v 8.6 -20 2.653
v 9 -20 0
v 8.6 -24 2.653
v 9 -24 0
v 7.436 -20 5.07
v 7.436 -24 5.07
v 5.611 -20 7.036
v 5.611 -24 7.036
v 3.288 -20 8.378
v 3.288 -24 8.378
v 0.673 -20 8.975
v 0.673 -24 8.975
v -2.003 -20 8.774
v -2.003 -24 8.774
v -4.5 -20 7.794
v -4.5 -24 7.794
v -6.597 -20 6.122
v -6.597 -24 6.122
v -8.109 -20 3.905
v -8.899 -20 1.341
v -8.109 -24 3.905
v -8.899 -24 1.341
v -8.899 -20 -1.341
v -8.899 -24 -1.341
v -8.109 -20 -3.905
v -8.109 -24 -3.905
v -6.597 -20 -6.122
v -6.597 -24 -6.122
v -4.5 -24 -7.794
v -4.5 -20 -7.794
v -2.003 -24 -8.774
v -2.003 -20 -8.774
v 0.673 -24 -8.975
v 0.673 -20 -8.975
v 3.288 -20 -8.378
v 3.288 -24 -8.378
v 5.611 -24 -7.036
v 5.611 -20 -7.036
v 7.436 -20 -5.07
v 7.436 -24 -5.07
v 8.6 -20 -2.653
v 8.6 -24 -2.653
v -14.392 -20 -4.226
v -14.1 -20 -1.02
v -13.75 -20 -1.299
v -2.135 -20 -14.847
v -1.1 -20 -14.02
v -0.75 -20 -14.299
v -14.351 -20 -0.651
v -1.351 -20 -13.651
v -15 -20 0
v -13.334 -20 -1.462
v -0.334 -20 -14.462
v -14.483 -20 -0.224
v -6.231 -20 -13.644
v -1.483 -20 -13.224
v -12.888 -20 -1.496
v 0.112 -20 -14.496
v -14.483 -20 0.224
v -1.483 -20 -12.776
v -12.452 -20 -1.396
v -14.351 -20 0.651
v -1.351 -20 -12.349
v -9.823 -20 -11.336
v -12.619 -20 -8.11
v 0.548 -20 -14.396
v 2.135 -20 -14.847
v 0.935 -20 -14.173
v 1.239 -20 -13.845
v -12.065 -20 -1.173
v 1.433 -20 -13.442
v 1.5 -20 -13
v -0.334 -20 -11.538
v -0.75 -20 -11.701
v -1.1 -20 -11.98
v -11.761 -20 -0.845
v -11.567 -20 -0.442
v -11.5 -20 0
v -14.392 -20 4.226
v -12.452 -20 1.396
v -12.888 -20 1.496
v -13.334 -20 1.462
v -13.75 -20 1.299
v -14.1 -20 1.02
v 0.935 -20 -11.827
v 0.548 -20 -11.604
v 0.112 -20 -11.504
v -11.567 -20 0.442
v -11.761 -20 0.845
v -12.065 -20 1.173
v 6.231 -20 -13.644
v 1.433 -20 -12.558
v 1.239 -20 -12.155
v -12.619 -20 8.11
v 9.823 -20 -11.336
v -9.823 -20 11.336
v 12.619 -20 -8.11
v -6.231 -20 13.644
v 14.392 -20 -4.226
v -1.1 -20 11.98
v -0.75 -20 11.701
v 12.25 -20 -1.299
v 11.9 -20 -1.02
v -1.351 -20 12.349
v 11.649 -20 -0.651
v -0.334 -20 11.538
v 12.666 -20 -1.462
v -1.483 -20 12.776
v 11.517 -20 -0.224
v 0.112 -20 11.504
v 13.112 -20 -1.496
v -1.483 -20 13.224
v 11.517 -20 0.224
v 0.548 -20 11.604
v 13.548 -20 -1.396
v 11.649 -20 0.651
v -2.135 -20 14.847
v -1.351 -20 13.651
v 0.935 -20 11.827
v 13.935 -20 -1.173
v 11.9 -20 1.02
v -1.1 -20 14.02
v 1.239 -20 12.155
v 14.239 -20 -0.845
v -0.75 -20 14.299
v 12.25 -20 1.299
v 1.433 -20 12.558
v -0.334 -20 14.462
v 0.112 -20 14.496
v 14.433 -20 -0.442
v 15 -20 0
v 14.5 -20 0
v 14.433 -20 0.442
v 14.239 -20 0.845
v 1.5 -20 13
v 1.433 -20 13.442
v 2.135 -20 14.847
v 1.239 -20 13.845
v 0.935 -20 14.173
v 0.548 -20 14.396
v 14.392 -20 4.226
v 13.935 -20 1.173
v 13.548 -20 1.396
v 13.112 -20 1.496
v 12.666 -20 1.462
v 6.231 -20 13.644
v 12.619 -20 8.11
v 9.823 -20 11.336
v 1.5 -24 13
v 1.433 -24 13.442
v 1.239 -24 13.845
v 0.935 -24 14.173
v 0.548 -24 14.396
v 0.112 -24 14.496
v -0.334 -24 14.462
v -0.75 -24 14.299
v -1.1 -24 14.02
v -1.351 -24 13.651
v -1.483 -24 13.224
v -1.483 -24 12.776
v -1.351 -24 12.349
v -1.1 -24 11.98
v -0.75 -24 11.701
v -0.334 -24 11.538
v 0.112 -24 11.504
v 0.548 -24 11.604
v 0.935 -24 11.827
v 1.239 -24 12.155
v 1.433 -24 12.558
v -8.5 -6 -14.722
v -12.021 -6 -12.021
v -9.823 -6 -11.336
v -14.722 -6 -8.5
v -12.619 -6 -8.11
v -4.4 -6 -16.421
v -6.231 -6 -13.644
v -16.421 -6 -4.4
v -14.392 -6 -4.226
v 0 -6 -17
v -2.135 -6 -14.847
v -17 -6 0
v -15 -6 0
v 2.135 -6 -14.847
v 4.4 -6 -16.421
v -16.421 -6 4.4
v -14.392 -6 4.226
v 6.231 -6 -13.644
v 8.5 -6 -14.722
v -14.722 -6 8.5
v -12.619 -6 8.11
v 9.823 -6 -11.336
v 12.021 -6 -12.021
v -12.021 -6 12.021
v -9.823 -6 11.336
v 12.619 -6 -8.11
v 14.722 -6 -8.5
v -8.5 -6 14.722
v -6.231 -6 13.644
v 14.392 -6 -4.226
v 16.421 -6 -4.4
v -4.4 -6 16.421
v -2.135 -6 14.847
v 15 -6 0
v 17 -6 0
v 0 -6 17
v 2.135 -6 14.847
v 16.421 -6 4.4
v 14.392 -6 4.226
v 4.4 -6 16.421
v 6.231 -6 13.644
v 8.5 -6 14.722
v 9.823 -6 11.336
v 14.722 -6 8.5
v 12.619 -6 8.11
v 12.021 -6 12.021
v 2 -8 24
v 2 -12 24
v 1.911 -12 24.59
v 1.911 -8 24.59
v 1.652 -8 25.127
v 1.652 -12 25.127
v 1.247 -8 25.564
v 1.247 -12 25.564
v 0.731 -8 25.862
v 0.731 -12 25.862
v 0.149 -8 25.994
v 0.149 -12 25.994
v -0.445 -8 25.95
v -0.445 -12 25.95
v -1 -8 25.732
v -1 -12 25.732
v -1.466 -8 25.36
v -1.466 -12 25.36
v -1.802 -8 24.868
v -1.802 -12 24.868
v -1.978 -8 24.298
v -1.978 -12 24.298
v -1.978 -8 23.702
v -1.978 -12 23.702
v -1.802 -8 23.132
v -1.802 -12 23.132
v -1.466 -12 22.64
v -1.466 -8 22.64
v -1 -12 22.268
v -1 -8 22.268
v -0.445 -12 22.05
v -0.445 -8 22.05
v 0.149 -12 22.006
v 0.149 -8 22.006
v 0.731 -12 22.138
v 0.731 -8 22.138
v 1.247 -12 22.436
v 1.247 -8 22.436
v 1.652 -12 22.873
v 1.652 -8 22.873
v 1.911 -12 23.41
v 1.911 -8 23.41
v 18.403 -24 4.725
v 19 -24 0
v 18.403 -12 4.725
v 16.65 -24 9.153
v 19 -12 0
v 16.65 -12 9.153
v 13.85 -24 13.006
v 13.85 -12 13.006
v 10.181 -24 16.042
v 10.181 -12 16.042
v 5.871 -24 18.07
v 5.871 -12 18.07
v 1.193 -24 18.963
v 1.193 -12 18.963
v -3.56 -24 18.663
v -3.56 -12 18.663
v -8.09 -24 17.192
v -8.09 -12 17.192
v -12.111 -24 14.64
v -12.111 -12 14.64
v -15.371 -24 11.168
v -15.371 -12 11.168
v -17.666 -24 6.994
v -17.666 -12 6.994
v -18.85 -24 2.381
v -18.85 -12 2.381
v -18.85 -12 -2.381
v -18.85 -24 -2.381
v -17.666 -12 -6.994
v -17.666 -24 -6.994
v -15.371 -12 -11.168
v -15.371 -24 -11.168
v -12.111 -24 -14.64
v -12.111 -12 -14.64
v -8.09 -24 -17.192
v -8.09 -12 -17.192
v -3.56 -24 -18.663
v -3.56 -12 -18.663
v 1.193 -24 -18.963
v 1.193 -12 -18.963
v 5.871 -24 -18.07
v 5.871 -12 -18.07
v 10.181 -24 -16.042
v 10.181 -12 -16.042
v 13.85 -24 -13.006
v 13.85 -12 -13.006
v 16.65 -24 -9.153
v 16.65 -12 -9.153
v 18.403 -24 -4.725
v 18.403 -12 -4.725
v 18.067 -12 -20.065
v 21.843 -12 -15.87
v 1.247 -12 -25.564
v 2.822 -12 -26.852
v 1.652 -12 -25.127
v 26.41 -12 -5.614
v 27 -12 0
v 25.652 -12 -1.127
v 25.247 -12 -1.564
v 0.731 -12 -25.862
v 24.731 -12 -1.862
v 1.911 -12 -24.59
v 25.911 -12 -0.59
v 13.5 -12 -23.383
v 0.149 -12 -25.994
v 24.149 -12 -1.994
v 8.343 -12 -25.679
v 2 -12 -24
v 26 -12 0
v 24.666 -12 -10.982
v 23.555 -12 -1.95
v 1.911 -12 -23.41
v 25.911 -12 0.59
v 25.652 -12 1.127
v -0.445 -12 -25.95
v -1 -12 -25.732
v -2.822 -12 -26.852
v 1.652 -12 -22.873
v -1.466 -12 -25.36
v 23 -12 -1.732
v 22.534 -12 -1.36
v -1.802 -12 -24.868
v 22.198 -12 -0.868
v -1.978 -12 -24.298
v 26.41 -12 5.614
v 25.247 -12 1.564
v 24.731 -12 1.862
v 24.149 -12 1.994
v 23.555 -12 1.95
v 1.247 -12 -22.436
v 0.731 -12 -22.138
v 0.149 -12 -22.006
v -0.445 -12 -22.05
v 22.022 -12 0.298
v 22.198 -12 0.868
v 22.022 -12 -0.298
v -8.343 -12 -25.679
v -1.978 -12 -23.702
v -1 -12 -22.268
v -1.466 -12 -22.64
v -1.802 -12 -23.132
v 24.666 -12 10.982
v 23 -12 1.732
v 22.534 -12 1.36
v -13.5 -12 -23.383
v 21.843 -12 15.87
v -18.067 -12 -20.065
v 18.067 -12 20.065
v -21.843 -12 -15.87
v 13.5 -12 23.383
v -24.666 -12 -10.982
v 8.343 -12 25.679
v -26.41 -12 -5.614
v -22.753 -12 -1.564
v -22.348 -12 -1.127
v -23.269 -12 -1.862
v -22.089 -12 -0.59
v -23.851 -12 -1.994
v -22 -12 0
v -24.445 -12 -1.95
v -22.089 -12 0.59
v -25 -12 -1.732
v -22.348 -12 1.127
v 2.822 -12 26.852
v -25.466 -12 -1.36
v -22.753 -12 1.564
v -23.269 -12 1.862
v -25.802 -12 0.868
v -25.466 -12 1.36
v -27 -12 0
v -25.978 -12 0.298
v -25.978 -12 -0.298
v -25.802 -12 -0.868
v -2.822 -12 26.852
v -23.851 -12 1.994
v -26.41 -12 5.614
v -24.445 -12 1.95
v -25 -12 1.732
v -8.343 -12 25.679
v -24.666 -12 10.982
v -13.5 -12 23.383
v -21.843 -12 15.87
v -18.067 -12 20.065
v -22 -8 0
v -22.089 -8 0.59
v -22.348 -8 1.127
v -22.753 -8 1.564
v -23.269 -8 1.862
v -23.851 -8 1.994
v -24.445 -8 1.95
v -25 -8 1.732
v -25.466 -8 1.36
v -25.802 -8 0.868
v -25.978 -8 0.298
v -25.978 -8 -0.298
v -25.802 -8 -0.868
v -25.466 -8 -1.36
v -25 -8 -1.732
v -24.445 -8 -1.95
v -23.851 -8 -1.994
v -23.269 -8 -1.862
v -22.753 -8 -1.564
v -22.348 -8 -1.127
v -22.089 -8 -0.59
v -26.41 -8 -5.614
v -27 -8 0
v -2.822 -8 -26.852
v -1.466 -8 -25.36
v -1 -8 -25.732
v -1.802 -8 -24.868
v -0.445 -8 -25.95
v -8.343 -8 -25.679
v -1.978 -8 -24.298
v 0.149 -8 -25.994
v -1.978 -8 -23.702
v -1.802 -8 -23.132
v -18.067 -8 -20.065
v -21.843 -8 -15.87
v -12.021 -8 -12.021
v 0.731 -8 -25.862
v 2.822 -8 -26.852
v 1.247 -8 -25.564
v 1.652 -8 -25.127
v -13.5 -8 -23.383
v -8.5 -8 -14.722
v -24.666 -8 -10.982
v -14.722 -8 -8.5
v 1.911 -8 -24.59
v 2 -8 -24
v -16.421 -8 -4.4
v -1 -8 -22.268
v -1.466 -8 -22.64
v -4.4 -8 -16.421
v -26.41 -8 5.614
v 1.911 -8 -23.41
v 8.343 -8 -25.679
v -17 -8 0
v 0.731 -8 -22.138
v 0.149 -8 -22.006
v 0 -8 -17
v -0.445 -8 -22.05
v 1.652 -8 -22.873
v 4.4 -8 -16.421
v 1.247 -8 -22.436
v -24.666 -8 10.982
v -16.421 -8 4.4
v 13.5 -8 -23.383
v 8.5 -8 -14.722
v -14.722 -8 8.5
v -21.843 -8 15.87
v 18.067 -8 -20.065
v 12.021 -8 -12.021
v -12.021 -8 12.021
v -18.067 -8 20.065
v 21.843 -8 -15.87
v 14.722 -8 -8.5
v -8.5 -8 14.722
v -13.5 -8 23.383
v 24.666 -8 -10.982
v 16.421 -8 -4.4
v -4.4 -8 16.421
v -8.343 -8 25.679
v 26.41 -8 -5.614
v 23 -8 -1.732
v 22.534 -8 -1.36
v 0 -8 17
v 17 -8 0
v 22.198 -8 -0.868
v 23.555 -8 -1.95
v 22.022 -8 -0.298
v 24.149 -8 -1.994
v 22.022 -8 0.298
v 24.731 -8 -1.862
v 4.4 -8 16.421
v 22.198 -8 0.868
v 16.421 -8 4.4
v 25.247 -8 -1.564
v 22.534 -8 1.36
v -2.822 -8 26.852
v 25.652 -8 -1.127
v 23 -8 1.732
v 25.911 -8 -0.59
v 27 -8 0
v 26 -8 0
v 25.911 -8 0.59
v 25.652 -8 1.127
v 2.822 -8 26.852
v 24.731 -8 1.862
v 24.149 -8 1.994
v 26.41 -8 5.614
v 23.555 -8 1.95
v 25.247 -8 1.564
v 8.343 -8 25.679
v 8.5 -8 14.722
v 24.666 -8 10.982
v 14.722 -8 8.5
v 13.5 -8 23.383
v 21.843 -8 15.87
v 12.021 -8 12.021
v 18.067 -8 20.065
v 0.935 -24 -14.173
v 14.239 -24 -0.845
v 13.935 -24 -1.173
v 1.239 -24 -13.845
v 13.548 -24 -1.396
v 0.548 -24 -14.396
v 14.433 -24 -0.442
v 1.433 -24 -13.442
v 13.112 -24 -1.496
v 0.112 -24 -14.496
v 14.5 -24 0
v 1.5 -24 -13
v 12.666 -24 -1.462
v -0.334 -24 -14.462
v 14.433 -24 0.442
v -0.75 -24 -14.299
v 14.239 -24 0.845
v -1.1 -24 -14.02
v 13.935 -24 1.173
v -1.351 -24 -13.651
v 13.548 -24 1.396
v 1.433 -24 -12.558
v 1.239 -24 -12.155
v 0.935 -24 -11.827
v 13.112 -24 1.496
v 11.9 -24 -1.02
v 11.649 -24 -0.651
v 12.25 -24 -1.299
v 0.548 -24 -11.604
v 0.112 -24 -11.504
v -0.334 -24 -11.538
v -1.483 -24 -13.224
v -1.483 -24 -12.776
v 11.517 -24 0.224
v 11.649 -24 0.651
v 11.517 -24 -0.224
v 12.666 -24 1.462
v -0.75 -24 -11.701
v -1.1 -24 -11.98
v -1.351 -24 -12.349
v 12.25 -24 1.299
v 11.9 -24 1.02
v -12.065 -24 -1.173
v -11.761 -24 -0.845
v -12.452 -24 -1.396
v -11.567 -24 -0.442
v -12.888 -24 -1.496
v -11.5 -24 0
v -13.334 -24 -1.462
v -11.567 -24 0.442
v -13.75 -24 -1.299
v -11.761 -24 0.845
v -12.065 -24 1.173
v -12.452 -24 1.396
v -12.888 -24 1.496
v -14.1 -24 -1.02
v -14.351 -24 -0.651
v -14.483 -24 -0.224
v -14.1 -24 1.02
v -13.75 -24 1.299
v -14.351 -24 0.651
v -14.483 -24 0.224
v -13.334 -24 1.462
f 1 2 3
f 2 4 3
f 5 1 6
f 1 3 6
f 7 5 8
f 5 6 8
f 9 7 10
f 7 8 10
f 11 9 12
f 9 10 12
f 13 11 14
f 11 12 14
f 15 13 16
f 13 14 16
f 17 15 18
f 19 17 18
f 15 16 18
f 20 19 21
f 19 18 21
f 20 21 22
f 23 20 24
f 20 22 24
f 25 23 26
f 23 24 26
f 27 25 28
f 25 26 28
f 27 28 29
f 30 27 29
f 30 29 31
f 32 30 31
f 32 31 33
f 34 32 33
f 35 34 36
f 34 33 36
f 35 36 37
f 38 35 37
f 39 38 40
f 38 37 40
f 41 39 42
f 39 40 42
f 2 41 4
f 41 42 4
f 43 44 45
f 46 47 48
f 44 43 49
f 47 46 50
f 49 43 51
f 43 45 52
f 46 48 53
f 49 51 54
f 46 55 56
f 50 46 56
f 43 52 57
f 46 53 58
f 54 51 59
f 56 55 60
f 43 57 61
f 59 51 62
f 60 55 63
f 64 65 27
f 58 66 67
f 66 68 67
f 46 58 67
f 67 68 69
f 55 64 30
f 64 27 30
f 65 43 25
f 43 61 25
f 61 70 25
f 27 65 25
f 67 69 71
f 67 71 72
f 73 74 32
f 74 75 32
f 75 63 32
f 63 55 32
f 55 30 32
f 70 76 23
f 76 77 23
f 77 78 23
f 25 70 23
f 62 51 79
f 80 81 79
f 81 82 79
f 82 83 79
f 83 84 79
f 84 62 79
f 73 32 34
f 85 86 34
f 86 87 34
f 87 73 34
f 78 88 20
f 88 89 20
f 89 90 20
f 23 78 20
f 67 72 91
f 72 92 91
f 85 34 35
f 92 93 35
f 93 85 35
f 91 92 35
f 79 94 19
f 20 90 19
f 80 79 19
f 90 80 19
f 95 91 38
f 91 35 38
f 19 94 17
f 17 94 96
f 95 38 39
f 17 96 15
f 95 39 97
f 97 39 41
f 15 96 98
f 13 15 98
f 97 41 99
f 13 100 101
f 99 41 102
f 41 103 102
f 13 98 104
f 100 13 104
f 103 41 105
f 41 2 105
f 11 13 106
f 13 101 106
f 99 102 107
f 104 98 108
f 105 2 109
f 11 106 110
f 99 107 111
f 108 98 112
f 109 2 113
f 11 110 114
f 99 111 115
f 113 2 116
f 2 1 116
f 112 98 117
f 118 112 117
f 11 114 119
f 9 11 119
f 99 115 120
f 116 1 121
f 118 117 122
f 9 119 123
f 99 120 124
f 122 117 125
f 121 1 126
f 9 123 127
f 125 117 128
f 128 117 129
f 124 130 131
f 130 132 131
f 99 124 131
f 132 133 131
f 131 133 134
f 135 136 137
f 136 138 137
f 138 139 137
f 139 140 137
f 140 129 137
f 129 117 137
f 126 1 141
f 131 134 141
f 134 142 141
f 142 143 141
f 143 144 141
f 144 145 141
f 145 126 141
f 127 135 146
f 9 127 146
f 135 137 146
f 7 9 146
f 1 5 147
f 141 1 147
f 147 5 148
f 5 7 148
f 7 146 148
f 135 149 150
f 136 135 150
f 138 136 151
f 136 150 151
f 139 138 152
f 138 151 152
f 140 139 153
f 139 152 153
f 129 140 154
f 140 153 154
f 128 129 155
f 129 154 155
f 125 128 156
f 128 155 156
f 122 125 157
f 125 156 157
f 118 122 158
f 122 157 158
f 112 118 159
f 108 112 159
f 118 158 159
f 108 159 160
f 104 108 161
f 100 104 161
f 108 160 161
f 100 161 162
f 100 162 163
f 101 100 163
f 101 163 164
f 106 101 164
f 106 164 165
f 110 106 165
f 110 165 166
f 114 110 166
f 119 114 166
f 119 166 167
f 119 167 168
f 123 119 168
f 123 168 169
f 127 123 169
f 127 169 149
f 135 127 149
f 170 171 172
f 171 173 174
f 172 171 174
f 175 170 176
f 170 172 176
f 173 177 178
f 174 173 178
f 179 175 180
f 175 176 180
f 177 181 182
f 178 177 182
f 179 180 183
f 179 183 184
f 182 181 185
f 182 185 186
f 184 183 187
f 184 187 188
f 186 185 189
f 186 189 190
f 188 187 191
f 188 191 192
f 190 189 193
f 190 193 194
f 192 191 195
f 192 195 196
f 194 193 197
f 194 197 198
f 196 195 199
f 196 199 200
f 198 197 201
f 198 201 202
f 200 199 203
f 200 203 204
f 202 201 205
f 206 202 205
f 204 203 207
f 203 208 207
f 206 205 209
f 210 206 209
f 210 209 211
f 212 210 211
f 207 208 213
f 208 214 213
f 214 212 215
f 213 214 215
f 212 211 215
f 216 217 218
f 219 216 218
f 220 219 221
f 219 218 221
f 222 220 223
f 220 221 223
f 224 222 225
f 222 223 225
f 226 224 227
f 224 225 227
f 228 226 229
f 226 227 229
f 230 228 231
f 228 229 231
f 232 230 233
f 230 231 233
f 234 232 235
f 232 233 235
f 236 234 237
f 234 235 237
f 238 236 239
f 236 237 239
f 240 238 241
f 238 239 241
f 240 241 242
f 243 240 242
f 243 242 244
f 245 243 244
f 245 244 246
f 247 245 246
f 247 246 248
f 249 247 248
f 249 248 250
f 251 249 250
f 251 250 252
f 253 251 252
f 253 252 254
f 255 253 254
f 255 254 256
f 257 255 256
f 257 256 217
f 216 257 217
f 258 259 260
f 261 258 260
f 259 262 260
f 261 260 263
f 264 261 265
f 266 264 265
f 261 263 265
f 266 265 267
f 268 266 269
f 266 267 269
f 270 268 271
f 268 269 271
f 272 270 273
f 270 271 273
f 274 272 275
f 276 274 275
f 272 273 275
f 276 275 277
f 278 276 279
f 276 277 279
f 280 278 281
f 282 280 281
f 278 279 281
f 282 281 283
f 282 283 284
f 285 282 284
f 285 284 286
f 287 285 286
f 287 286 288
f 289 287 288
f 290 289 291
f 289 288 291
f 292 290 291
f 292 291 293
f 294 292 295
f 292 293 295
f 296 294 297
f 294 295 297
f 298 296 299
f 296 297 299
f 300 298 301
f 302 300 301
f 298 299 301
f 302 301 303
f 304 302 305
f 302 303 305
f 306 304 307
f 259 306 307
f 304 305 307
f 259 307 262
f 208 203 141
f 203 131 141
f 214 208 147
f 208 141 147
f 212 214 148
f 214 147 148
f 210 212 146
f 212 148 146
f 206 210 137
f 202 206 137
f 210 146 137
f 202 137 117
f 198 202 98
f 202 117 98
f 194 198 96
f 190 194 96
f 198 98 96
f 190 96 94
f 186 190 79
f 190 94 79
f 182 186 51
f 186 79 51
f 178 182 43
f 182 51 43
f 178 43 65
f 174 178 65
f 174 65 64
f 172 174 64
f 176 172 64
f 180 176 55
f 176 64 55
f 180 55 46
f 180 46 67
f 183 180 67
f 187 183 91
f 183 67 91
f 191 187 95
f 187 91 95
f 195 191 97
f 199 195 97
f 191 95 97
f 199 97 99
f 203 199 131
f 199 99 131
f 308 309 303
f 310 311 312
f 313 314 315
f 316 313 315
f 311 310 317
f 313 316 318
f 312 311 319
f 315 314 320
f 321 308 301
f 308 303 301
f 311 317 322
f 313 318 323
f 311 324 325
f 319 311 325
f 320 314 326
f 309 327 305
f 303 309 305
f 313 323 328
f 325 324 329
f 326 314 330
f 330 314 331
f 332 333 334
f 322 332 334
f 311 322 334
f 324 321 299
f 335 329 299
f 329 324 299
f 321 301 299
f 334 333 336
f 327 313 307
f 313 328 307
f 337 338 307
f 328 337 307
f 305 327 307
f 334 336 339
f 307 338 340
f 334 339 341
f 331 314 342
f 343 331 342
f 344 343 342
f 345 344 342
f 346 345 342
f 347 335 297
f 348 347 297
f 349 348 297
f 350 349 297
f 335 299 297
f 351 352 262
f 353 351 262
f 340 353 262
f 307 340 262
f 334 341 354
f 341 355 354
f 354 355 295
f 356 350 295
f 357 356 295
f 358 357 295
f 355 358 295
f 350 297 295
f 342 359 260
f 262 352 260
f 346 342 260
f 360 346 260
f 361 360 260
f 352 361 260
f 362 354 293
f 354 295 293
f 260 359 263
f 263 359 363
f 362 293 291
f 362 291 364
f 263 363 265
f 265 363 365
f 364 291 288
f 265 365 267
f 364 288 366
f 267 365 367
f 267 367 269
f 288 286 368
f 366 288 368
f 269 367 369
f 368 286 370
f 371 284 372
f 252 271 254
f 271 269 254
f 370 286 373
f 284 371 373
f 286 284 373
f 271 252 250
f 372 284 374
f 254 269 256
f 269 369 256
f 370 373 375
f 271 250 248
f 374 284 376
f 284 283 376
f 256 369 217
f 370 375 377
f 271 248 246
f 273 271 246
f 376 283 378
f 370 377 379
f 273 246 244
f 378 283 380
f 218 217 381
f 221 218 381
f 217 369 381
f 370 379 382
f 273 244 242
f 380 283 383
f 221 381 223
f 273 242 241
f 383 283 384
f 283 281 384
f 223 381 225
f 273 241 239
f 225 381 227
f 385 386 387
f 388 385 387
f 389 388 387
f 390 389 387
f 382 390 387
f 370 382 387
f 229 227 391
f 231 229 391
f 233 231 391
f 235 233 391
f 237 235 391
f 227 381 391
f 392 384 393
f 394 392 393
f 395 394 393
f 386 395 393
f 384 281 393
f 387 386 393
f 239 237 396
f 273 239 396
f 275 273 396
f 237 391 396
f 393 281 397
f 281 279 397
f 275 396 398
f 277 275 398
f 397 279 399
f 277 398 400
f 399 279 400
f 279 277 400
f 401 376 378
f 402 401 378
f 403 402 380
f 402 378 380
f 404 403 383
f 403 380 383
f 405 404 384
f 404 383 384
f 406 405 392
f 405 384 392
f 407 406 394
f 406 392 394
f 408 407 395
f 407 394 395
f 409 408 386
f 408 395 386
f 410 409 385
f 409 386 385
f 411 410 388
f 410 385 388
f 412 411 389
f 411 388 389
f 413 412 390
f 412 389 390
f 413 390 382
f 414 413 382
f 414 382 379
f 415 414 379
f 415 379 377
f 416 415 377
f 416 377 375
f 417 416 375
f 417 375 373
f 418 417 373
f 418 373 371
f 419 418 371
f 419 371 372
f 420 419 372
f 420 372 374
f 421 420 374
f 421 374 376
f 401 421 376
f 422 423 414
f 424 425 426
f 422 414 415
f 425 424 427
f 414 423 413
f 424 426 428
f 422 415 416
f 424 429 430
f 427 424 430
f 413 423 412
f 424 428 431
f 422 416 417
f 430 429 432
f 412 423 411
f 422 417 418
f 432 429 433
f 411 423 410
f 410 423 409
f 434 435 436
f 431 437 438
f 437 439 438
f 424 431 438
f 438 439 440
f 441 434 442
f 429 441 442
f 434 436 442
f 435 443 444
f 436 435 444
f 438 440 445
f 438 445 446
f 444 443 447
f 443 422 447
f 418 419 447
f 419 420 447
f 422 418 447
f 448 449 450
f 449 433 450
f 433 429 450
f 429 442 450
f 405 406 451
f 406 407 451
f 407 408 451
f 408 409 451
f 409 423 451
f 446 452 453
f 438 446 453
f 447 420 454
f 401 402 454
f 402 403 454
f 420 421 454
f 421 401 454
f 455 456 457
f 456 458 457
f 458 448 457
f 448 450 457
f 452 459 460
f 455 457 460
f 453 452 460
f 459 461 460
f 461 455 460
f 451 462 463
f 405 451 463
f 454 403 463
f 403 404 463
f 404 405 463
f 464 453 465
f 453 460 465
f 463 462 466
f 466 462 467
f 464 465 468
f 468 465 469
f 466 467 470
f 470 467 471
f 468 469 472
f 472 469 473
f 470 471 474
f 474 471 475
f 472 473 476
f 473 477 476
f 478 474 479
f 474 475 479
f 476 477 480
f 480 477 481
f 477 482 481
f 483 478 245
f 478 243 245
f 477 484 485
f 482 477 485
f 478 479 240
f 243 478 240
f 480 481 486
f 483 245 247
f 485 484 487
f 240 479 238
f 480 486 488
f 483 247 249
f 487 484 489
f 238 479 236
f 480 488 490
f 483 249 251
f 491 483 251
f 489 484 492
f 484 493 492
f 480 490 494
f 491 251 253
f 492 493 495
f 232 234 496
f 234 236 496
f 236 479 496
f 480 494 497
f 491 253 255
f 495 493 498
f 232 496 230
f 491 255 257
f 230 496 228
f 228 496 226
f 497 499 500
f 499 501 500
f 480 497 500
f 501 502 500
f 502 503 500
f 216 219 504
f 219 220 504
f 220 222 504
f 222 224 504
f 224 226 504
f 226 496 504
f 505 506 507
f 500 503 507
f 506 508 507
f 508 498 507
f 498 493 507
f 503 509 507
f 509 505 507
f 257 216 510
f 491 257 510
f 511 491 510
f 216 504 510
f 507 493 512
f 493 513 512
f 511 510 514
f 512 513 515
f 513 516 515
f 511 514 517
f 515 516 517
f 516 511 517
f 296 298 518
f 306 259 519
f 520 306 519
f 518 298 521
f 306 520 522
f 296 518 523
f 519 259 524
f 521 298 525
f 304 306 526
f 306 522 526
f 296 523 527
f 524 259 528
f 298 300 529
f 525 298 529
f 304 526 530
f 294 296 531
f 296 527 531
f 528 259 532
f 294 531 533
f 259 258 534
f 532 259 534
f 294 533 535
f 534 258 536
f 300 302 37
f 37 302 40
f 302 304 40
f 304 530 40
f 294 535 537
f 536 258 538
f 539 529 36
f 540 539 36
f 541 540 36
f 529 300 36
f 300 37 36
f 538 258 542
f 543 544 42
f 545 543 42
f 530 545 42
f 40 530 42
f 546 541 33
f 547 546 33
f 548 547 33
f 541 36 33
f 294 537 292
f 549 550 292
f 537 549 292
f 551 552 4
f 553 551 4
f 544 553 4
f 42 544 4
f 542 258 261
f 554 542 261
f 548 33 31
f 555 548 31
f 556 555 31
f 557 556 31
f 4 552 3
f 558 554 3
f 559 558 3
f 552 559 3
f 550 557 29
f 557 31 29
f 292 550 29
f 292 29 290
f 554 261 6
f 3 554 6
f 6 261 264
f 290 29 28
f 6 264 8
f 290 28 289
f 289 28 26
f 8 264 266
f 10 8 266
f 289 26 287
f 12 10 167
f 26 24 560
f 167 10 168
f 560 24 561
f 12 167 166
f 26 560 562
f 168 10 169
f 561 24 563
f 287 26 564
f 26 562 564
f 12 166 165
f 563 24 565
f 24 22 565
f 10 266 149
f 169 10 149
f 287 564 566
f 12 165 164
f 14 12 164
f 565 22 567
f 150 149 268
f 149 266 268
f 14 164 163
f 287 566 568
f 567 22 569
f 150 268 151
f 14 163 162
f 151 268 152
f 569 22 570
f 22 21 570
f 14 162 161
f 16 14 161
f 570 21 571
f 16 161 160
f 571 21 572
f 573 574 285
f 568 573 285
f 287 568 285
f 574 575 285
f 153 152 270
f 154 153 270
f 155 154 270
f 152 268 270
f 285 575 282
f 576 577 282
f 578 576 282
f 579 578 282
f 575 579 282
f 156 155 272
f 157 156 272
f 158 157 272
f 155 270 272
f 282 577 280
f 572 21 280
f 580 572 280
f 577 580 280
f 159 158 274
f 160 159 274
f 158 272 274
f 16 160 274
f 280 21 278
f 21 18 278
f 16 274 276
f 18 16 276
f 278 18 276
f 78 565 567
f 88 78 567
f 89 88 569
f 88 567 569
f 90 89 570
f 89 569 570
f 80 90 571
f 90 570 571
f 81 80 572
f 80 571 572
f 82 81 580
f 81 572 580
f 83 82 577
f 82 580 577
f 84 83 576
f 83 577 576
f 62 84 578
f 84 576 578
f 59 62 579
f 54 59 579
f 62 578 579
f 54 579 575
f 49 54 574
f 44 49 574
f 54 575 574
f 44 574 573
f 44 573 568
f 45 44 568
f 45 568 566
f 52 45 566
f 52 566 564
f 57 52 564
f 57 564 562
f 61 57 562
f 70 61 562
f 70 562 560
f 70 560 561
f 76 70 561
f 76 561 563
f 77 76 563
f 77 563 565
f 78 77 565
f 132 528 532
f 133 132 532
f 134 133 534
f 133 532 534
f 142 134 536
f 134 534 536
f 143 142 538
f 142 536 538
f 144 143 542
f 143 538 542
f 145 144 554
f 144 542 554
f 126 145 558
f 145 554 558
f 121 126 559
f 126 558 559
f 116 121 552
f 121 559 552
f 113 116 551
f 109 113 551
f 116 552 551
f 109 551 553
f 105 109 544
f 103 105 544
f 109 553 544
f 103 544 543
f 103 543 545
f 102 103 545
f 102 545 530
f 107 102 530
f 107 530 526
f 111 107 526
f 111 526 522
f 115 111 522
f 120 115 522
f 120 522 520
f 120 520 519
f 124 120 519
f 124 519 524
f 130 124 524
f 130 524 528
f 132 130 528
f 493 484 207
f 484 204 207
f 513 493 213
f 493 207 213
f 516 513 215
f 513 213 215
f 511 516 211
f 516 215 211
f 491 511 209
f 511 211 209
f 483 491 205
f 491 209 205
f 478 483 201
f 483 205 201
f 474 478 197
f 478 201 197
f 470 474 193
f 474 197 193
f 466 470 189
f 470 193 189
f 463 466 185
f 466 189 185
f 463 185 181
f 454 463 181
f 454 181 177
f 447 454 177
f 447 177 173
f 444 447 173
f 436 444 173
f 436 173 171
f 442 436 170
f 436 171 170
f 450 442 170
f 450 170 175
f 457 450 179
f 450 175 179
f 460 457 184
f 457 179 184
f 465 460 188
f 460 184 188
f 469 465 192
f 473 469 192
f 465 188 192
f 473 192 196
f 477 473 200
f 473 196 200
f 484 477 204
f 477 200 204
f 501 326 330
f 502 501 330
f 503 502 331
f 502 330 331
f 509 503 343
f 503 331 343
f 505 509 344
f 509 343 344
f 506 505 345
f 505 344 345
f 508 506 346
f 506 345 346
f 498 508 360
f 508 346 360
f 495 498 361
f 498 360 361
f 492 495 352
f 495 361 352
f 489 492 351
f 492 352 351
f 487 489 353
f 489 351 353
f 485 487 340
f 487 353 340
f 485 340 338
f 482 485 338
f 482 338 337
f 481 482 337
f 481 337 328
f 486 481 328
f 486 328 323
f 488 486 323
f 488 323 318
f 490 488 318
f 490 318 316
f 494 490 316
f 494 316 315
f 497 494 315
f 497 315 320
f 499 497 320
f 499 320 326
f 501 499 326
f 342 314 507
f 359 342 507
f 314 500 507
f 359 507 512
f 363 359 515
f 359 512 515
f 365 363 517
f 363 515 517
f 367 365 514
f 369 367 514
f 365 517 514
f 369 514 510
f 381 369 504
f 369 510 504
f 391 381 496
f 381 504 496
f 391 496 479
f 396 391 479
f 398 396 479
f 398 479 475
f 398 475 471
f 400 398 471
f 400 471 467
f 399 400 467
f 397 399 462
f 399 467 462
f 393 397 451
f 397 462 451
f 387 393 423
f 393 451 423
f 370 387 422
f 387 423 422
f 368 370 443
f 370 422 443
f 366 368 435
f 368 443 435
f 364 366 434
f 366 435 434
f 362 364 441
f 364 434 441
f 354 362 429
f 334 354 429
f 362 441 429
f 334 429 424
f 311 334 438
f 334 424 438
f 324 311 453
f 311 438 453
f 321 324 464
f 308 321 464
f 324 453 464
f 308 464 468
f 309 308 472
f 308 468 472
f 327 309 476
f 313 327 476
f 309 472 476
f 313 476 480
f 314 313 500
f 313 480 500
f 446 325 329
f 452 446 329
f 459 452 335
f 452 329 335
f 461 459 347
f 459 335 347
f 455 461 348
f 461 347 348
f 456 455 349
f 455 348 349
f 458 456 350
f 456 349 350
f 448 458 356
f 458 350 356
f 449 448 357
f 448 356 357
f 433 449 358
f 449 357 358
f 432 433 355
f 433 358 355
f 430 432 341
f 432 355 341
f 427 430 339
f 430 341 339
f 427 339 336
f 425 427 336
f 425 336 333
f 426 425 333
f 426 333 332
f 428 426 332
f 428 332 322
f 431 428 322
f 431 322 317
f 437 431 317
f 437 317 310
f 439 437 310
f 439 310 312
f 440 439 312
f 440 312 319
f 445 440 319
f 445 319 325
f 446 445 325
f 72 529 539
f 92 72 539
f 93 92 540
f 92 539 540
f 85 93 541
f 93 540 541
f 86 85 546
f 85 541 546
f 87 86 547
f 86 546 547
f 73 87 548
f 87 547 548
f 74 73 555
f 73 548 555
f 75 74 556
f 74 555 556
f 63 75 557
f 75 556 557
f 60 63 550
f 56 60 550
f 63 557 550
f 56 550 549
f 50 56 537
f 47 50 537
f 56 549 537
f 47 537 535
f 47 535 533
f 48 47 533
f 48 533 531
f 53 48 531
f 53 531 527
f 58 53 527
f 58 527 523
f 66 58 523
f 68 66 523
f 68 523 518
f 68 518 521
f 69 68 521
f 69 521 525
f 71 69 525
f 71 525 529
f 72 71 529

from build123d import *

# Parameters (mm, degrees)
ESQUISSE4_R      = 1.5
EXTRUSION3_DEPTH = 19
ESQUISSE3_R      = 2
EXTRUSION4_DEPTH = 7


with BuildPart() as part:
    # Esquisse1 → Révolution1 (revolve)
    with BuildSketch(Plane.XY):
        Polygon((19, -12), (27, -12), (27, -8), (17, -8), (17, -6), (15, -6), (15, -20), (9, -20), (9, -24), (19, -24), align=None)
    revolve(axis=Axis((0, 0, 0), (0, -1, 0)))

    # Esquisse4 → Extrusion3 (cut, through all)
    with BuildSketch(Plane.XZ.offset(24)):
        with Locations((0, 13)):
            Circle(ESQUISSE4_R)
        with Locations((13, 0)):
            Circle(ESQUISSE4_R)
        with Locations((0, -13)):
            Circle(ESQUISSE4_R)
        with Locations((-13, 0)):
            Circle(ESQUISSE4_R)
    extrude(amount=-EXTRUSION3_DEPTH, mode=Mode.SUBTRACT)

    # Esquisse3 → Extrusion4 (cut, through all)
    with BuildSketch(Plane.XZ.offset(12)):
        with Locations((24, 0)):
            Circle(ESQUISSE3_R)
        with Locations((0, 24)):
            Circle(ESQUISSE3_R)
        with Locations((0, -24)):
            Circle(ESQUISSE3_R)
        with Locations((-24, 0)):
            Circle(ESQUISSE3_R)
    extrude(amount=-EXTRUSION4_DEPTH, mode=Mode.SUBTRACT)


solid = part.part
